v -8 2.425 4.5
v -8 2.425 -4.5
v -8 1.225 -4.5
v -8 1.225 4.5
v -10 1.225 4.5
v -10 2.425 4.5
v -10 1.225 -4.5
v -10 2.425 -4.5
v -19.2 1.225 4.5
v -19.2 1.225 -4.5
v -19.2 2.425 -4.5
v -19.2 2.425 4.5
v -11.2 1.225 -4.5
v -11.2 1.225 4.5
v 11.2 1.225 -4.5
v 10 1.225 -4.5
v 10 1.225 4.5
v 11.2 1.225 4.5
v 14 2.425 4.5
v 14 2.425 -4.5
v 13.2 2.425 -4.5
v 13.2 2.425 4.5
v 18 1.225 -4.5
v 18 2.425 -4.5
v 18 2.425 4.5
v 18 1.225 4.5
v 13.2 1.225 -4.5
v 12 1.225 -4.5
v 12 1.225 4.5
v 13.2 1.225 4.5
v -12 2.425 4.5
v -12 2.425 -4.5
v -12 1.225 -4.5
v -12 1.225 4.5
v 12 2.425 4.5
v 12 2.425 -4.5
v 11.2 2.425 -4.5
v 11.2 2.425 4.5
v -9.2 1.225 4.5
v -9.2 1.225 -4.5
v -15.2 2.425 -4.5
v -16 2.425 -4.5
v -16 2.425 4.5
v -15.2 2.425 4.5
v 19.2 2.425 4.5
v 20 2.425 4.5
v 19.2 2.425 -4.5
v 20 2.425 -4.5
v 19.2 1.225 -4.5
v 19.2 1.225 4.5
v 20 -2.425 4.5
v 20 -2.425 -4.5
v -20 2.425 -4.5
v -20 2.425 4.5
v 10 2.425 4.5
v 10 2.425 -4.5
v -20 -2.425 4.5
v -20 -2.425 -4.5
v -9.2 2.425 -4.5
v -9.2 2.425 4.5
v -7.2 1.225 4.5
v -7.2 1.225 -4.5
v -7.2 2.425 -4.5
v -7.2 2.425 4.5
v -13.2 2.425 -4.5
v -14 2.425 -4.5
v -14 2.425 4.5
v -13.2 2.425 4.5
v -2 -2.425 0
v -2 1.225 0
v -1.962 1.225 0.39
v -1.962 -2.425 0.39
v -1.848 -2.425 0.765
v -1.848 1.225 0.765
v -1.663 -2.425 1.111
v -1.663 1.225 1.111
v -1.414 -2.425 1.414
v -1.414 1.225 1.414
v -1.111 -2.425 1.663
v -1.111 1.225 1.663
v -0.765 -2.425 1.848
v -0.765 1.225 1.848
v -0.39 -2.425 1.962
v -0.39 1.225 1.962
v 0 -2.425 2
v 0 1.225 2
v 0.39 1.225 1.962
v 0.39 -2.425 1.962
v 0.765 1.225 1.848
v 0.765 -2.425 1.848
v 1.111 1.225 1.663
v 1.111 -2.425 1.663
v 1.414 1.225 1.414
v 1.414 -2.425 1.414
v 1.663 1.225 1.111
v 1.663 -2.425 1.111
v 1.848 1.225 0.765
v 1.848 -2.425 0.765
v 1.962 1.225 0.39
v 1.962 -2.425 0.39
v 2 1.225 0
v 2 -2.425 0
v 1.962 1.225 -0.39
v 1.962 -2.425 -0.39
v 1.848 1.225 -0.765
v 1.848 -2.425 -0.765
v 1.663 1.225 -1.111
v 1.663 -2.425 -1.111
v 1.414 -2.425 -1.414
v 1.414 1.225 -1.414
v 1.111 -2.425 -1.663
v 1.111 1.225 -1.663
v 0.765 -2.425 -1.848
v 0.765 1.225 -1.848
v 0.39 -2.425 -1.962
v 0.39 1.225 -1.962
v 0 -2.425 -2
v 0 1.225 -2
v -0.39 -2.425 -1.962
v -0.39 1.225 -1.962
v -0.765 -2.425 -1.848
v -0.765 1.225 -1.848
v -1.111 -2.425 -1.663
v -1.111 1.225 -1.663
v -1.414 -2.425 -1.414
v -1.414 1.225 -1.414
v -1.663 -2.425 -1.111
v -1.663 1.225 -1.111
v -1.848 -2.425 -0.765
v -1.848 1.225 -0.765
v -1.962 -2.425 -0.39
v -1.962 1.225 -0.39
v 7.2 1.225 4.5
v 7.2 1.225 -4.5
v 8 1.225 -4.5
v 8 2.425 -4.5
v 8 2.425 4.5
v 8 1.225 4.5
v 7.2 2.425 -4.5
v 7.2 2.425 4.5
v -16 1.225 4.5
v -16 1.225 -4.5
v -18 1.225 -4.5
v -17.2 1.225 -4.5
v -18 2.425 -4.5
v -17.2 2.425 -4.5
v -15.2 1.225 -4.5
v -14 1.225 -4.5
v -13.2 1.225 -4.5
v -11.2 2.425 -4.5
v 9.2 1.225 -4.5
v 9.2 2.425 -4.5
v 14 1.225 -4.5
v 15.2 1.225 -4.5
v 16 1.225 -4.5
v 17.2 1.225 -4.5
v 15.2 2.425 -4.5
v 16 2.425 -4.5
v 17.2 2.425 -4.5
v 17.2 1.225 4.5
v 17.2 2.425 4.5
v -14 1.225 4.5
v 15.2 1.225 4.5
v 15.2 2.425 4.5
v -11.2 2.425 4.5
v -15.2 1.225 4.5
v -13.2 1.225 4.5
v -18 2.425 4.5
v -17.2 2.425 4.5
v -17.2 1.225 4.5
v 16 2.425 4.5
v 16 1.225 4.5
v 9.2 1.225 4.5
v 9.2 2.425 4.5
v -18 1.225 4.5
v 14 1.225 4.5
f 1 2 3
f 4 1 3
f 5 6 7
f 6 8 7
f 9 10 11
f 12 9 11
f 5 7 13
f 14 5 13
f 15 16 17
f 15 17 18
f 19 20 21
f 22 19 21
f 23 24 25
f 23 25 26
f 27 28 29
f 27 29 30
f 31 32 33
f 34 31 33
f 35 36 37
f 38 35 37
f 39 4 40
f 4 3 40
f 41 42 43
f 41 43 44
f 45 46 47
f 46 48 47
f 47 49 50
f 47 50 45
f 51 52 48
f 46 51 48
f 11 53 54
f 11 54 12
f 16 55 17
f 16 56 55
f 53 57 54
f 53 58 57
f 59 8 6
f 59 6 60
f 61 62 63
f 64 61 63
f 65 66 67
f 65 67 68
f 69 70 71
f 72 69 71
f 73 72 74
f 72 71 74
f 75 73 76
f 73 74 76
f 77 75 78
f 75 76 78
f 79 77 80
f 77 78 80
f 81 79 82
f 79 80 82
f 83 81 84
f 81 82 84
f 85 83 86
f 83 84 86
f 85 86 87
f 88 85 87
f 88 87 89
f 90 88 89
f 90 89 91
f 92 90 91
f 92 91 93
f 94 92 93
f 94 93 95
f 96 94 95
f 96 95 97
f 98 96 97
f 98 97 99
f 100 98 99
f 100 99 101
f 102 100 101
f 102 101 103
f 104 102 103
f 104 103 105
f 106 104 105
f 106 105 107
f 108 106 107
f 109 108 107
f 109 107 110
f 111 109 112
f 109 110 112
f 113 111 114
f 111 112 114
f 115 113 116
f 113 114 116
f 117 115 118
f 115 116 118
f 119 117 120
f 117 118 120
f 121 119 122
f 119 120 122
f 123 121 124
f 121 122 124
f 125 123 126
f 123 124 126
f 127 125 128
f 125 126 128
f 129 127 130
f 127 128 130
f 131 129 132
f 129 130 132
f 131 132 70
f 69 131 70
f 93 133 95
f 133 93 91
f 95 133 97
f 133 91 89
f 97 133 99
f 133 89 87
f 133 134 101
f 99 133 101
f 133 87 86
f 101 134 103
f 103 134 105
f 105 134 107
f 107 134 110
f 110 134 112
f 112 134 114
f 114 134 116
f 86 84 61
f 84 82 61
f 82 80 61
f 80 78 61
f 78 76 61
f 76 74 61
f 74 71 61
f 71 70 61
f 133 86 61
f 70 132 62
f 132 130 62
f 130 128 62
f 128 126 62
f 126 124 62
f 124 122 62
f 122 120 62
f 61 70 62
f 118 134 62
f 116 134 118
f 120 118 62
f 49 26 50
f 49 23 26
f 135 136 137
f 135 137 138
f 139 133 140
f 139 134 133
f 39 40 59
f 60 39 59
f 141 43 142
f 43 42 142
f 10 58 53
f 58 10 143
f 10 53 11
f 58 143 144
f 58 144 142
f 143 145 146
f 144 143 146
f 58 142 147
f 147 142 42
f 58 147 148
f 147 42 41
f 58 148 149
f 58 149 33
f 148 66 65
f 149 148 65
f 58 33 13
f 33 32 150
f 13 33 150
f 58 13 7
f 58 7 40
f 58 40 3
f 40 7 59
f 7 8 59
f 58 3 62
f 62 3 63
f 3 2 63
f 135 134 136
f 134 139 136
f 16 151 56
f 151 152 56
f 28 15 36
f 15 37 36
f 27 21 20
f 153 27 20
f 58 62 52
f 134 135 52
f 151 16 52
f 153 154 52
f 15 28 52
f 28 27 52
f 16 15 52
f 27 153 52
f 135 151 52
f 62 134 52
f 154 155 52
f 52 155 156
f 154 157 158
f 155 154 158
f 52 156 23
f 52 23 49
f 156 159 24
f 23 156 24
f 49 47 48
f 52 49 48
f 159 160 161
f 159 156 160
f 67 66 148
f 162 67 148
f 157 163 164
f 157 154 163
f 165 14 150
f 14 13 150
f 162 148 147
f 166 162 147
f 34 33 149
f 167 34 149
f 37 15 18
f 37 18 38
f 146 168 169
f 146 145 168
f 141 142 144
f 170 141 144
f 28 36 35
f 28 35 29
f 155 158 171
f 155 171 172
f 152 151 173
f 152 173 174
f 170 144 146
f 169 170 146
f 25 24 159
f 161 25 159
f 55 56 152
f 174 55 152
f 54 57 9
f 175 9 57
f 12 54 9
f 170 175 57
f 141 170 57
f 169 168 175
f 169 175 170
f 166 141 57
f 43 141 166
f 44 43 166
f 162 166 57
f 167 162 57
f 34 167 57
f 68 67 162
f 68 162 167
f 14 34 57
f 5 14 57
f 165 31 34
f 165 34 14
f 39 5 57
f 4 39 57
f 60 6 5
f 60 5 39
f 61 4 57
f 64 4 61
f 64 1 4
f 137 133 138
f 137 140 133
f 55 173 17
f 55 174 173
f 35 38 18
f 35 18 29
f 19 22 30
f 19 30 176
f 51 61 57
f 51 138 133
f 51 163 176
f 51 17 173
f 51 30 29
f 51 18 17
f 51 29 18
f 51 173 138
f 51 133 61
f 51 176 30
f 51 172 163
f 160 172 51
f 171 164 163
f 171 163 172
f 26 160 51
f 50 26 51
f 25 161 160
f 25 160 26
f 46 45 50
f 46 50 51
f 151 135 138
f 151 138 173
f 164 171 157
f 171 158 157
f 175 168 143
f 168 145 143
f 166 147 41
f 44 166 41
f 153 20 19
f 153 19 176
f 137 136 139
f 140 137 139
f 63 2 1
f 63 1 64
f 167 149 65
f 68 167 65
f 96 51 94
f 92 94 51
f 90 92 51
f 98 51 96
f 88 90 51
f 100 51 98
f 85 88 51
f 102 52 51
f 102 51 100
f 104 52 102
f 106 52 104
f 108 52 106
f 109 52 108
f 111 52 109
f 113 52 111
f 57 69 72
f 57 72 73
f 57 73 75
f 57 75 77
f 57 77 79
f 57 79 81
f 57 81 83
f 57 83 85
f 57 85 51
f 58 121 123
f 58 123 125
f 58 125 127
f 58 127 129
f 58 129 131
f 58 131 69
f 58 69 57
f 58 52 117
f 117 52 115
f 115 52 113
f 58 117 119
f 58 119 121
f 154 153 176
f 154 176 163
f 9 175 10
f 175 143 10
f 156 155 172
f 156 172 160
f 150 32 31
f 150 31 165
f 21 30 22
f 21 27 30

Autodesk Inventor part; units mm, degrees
ref_plane "YZ Plane" through (0, 0, 0) normal (1, 0, 0) x (0, 1, 0)
ref_plane "XZ Plane" through (0, 0, 0) normal (0, 1, 0) x (-1, 0, 0)
ref_plane "XY Plane" through (0, 0, 0) normal (0, 0, 1) x (1, 0, 0)
sketch "Sketch1" plane through (0, 0, 0) normal (0, 0, 1) x (1, 0, 0)
  line L0 (-20, 2.425) -> (-19.2, 2.425)
  line L1 (0, -2.425) -> (-20, -2.425)
  line L2 (-20, -2.425) -> (-20, 2.425)
  line L3 (-18, 2.425) -> (-18, 1.225)
  line L4 (-18, 1.225) -> (-19.2, 1.225)
  line L5 (-19.2, 1.225) -> (-19.2, 2.425)
  line L6 (-16, 2.425) -> (-16, 1.225)
  line L7 (-16, 1.225) -> (-17.2, 1.225)
  line L8 (-17.2, 1.225) -> (-17.2, 2.425)
  line L9 (-14, 2.425) -> (-14, 1.225)
  line L10 (-14, 1.225) -> (-15.2, 1.225)
  line L11 (-15.2, 1.225) -> (-15.2, 2.425)
  line L12 (-12, 2.425) -> (-12, 1.225)
  line L13 (-12, 1.225) -> (-13.2, 1.225)
  line L14 (-13.2, 1.225) -> (-13.2, 2.425)
  line L15 (-10, 2.425) -> (-10, 1.225)
  line L16 (-10, 1.225) -> (-11.2, 1.225)
  line L17 (-11.2, 1.225) -> (-11.2, 2.425)
  line L18 (-20, 1.225) -> (0, 1.225) construction
  line L19 (0, 0) -> (-20, 0) construction
  line L20 (-8, 2.425) -> (-8, 1.225)
  line L21 (-8, 1.225) -> (-9.2, 1.225)
  line L22 (-9.2, 1.225) -> (-9.2, 2.425)
  line L23 (0, 1.225) -> (-7.2, 1.225)
  line L24 (-7.2, 1.225) -> (-7.2, 2.425)
  line L25 (-18, 2.425) -> (-17.2, 2.425)
  line L26 (-16, 2.425) -> (-15.2, 2.425)
  line L27 (-14, 2.425) -> (-13.2, 2.425)
  line L28 (-12, 2.425) -> (-11.2, 2.425)
  line L29 (-10, 2.425) -> (-9.2, 2.425)
  line L30 (-8, 2.425) -> (-7.2, 2.425)
  line L31 (0, 1.225) -> (0, -2.425) construction
  line L32 (20, 2.425) -> (19.2, 2.425)
  line L33 (0, -2.425) -> (20, -2.425)
  line L34 (20, -2.425) -> (20, 2.425)
  line L35 (18, 2.425) -> (18, 1.225)
  line L36 (18, 1.225) -> (19.2, 1.225)
  line L37 (19.2, 1.225) -> (19.2, 2.425)
  line L38 (16, 2.425) -> (16, 1.225)
  line L39 (16, 1.225) -> (17.2, 1.225)
  line L40 (17.2, 1.225) -> (17.2, 2.425)
  line L41 (14, 2.425) -> (14, 1.225)
  line L42 (14, 1.225) -> (15.2, 1.225)
  line L43 (15.2, 1.225) -> (15.2, 2.425)
  line L44 (12, 2.425) -> (12, 1.225)
  line L45 (12, 1.225) -> (13.2, 1.225)
  line L46 (13.2, 1.225) -> (13.2, 2.425)
  line L47 (10, 2.425) -> (10, 1.225)
  line L48 (10, 1.225) -> (11.2, 1.225)
  line L49 (11.2, 1.225) -> (11.2, 2.425)
  line L50 (20, 1.225) -> (0, 1.225) construction
  line L51 (0, 0) -> (20, 0) construction
  line L52 (8, 2.425) -> (8, 1.225)
  line L53 (8, 1.225) -> (9.2, 1.225)
  line L54 (9.2, 1.225) -> (9.2, 2.425)
  line L55 (0, 1.225) -> (7.2, 1.225)
  line L56 (7.2, 1.225) -> (7.2, 2.425)
  line L57 (18, 2.425) -> (17.2, 2.425)
  line L58 (16, 2.425) -> (15.2, 2.425)
  line L59 (14, 2.425) -> (13.2, 2.425)
  line L60 (12, 2.425) -> (11.2, 2.425)
  line L61 (10, 2.425) -> (9.2, 2.425)
  line L62 (8, 2.425) -> (7.2, 2.425)
  dimension "d0" = 4.85
  dimension "d3" = 1.2
  dimension "d4" = 0.8
  dimension "d5" = 1.2
  dimension "d6" = 0.8
  dimension "d7" = 1.2
  dimension "d8" = 0.8
  dimension "d9" = 1.2
  dimension "d10" = 0.8
  dimension "d13" = 0.8
  dimension "d14" = 1.2
  dimension "d15" = 0.8
  dimension "d16" = 1.2
  dimension "d17" = 0.8
  dimension "d18" = 40
  dimension "d19" = 3.65
extrude "Extrusion1" add sketch "Sketch1" along normal mid plane 9
sketch "Sketch2" plane through (0, 0, 0) normal (0, 1, 0) x (-1, 0, 0)
  circle A0 centre (0, 0) radius 2.2937
  circle A1 centre (0, 0) radius 2
  dimension "d22" = 4
extrude "Extrusion2" cut sketch "Sketch2" along normal through all both and the other way through all contours A1
equation "\"d5\" = d3"
equation "\"d7\" = d3"
equation "\"d8\" = d4"
equation "\"d9\" = d3"
equation "\"d10\" = d4"
equation "\"d13\" = d4"
equation "\"d14\" = d3"
equation "\"d15\" = d4"
equation "\"d16\" = d3"
equation "\"d17\" = d4"
properties part number "fixador-correia" material "Steel, Cast"
